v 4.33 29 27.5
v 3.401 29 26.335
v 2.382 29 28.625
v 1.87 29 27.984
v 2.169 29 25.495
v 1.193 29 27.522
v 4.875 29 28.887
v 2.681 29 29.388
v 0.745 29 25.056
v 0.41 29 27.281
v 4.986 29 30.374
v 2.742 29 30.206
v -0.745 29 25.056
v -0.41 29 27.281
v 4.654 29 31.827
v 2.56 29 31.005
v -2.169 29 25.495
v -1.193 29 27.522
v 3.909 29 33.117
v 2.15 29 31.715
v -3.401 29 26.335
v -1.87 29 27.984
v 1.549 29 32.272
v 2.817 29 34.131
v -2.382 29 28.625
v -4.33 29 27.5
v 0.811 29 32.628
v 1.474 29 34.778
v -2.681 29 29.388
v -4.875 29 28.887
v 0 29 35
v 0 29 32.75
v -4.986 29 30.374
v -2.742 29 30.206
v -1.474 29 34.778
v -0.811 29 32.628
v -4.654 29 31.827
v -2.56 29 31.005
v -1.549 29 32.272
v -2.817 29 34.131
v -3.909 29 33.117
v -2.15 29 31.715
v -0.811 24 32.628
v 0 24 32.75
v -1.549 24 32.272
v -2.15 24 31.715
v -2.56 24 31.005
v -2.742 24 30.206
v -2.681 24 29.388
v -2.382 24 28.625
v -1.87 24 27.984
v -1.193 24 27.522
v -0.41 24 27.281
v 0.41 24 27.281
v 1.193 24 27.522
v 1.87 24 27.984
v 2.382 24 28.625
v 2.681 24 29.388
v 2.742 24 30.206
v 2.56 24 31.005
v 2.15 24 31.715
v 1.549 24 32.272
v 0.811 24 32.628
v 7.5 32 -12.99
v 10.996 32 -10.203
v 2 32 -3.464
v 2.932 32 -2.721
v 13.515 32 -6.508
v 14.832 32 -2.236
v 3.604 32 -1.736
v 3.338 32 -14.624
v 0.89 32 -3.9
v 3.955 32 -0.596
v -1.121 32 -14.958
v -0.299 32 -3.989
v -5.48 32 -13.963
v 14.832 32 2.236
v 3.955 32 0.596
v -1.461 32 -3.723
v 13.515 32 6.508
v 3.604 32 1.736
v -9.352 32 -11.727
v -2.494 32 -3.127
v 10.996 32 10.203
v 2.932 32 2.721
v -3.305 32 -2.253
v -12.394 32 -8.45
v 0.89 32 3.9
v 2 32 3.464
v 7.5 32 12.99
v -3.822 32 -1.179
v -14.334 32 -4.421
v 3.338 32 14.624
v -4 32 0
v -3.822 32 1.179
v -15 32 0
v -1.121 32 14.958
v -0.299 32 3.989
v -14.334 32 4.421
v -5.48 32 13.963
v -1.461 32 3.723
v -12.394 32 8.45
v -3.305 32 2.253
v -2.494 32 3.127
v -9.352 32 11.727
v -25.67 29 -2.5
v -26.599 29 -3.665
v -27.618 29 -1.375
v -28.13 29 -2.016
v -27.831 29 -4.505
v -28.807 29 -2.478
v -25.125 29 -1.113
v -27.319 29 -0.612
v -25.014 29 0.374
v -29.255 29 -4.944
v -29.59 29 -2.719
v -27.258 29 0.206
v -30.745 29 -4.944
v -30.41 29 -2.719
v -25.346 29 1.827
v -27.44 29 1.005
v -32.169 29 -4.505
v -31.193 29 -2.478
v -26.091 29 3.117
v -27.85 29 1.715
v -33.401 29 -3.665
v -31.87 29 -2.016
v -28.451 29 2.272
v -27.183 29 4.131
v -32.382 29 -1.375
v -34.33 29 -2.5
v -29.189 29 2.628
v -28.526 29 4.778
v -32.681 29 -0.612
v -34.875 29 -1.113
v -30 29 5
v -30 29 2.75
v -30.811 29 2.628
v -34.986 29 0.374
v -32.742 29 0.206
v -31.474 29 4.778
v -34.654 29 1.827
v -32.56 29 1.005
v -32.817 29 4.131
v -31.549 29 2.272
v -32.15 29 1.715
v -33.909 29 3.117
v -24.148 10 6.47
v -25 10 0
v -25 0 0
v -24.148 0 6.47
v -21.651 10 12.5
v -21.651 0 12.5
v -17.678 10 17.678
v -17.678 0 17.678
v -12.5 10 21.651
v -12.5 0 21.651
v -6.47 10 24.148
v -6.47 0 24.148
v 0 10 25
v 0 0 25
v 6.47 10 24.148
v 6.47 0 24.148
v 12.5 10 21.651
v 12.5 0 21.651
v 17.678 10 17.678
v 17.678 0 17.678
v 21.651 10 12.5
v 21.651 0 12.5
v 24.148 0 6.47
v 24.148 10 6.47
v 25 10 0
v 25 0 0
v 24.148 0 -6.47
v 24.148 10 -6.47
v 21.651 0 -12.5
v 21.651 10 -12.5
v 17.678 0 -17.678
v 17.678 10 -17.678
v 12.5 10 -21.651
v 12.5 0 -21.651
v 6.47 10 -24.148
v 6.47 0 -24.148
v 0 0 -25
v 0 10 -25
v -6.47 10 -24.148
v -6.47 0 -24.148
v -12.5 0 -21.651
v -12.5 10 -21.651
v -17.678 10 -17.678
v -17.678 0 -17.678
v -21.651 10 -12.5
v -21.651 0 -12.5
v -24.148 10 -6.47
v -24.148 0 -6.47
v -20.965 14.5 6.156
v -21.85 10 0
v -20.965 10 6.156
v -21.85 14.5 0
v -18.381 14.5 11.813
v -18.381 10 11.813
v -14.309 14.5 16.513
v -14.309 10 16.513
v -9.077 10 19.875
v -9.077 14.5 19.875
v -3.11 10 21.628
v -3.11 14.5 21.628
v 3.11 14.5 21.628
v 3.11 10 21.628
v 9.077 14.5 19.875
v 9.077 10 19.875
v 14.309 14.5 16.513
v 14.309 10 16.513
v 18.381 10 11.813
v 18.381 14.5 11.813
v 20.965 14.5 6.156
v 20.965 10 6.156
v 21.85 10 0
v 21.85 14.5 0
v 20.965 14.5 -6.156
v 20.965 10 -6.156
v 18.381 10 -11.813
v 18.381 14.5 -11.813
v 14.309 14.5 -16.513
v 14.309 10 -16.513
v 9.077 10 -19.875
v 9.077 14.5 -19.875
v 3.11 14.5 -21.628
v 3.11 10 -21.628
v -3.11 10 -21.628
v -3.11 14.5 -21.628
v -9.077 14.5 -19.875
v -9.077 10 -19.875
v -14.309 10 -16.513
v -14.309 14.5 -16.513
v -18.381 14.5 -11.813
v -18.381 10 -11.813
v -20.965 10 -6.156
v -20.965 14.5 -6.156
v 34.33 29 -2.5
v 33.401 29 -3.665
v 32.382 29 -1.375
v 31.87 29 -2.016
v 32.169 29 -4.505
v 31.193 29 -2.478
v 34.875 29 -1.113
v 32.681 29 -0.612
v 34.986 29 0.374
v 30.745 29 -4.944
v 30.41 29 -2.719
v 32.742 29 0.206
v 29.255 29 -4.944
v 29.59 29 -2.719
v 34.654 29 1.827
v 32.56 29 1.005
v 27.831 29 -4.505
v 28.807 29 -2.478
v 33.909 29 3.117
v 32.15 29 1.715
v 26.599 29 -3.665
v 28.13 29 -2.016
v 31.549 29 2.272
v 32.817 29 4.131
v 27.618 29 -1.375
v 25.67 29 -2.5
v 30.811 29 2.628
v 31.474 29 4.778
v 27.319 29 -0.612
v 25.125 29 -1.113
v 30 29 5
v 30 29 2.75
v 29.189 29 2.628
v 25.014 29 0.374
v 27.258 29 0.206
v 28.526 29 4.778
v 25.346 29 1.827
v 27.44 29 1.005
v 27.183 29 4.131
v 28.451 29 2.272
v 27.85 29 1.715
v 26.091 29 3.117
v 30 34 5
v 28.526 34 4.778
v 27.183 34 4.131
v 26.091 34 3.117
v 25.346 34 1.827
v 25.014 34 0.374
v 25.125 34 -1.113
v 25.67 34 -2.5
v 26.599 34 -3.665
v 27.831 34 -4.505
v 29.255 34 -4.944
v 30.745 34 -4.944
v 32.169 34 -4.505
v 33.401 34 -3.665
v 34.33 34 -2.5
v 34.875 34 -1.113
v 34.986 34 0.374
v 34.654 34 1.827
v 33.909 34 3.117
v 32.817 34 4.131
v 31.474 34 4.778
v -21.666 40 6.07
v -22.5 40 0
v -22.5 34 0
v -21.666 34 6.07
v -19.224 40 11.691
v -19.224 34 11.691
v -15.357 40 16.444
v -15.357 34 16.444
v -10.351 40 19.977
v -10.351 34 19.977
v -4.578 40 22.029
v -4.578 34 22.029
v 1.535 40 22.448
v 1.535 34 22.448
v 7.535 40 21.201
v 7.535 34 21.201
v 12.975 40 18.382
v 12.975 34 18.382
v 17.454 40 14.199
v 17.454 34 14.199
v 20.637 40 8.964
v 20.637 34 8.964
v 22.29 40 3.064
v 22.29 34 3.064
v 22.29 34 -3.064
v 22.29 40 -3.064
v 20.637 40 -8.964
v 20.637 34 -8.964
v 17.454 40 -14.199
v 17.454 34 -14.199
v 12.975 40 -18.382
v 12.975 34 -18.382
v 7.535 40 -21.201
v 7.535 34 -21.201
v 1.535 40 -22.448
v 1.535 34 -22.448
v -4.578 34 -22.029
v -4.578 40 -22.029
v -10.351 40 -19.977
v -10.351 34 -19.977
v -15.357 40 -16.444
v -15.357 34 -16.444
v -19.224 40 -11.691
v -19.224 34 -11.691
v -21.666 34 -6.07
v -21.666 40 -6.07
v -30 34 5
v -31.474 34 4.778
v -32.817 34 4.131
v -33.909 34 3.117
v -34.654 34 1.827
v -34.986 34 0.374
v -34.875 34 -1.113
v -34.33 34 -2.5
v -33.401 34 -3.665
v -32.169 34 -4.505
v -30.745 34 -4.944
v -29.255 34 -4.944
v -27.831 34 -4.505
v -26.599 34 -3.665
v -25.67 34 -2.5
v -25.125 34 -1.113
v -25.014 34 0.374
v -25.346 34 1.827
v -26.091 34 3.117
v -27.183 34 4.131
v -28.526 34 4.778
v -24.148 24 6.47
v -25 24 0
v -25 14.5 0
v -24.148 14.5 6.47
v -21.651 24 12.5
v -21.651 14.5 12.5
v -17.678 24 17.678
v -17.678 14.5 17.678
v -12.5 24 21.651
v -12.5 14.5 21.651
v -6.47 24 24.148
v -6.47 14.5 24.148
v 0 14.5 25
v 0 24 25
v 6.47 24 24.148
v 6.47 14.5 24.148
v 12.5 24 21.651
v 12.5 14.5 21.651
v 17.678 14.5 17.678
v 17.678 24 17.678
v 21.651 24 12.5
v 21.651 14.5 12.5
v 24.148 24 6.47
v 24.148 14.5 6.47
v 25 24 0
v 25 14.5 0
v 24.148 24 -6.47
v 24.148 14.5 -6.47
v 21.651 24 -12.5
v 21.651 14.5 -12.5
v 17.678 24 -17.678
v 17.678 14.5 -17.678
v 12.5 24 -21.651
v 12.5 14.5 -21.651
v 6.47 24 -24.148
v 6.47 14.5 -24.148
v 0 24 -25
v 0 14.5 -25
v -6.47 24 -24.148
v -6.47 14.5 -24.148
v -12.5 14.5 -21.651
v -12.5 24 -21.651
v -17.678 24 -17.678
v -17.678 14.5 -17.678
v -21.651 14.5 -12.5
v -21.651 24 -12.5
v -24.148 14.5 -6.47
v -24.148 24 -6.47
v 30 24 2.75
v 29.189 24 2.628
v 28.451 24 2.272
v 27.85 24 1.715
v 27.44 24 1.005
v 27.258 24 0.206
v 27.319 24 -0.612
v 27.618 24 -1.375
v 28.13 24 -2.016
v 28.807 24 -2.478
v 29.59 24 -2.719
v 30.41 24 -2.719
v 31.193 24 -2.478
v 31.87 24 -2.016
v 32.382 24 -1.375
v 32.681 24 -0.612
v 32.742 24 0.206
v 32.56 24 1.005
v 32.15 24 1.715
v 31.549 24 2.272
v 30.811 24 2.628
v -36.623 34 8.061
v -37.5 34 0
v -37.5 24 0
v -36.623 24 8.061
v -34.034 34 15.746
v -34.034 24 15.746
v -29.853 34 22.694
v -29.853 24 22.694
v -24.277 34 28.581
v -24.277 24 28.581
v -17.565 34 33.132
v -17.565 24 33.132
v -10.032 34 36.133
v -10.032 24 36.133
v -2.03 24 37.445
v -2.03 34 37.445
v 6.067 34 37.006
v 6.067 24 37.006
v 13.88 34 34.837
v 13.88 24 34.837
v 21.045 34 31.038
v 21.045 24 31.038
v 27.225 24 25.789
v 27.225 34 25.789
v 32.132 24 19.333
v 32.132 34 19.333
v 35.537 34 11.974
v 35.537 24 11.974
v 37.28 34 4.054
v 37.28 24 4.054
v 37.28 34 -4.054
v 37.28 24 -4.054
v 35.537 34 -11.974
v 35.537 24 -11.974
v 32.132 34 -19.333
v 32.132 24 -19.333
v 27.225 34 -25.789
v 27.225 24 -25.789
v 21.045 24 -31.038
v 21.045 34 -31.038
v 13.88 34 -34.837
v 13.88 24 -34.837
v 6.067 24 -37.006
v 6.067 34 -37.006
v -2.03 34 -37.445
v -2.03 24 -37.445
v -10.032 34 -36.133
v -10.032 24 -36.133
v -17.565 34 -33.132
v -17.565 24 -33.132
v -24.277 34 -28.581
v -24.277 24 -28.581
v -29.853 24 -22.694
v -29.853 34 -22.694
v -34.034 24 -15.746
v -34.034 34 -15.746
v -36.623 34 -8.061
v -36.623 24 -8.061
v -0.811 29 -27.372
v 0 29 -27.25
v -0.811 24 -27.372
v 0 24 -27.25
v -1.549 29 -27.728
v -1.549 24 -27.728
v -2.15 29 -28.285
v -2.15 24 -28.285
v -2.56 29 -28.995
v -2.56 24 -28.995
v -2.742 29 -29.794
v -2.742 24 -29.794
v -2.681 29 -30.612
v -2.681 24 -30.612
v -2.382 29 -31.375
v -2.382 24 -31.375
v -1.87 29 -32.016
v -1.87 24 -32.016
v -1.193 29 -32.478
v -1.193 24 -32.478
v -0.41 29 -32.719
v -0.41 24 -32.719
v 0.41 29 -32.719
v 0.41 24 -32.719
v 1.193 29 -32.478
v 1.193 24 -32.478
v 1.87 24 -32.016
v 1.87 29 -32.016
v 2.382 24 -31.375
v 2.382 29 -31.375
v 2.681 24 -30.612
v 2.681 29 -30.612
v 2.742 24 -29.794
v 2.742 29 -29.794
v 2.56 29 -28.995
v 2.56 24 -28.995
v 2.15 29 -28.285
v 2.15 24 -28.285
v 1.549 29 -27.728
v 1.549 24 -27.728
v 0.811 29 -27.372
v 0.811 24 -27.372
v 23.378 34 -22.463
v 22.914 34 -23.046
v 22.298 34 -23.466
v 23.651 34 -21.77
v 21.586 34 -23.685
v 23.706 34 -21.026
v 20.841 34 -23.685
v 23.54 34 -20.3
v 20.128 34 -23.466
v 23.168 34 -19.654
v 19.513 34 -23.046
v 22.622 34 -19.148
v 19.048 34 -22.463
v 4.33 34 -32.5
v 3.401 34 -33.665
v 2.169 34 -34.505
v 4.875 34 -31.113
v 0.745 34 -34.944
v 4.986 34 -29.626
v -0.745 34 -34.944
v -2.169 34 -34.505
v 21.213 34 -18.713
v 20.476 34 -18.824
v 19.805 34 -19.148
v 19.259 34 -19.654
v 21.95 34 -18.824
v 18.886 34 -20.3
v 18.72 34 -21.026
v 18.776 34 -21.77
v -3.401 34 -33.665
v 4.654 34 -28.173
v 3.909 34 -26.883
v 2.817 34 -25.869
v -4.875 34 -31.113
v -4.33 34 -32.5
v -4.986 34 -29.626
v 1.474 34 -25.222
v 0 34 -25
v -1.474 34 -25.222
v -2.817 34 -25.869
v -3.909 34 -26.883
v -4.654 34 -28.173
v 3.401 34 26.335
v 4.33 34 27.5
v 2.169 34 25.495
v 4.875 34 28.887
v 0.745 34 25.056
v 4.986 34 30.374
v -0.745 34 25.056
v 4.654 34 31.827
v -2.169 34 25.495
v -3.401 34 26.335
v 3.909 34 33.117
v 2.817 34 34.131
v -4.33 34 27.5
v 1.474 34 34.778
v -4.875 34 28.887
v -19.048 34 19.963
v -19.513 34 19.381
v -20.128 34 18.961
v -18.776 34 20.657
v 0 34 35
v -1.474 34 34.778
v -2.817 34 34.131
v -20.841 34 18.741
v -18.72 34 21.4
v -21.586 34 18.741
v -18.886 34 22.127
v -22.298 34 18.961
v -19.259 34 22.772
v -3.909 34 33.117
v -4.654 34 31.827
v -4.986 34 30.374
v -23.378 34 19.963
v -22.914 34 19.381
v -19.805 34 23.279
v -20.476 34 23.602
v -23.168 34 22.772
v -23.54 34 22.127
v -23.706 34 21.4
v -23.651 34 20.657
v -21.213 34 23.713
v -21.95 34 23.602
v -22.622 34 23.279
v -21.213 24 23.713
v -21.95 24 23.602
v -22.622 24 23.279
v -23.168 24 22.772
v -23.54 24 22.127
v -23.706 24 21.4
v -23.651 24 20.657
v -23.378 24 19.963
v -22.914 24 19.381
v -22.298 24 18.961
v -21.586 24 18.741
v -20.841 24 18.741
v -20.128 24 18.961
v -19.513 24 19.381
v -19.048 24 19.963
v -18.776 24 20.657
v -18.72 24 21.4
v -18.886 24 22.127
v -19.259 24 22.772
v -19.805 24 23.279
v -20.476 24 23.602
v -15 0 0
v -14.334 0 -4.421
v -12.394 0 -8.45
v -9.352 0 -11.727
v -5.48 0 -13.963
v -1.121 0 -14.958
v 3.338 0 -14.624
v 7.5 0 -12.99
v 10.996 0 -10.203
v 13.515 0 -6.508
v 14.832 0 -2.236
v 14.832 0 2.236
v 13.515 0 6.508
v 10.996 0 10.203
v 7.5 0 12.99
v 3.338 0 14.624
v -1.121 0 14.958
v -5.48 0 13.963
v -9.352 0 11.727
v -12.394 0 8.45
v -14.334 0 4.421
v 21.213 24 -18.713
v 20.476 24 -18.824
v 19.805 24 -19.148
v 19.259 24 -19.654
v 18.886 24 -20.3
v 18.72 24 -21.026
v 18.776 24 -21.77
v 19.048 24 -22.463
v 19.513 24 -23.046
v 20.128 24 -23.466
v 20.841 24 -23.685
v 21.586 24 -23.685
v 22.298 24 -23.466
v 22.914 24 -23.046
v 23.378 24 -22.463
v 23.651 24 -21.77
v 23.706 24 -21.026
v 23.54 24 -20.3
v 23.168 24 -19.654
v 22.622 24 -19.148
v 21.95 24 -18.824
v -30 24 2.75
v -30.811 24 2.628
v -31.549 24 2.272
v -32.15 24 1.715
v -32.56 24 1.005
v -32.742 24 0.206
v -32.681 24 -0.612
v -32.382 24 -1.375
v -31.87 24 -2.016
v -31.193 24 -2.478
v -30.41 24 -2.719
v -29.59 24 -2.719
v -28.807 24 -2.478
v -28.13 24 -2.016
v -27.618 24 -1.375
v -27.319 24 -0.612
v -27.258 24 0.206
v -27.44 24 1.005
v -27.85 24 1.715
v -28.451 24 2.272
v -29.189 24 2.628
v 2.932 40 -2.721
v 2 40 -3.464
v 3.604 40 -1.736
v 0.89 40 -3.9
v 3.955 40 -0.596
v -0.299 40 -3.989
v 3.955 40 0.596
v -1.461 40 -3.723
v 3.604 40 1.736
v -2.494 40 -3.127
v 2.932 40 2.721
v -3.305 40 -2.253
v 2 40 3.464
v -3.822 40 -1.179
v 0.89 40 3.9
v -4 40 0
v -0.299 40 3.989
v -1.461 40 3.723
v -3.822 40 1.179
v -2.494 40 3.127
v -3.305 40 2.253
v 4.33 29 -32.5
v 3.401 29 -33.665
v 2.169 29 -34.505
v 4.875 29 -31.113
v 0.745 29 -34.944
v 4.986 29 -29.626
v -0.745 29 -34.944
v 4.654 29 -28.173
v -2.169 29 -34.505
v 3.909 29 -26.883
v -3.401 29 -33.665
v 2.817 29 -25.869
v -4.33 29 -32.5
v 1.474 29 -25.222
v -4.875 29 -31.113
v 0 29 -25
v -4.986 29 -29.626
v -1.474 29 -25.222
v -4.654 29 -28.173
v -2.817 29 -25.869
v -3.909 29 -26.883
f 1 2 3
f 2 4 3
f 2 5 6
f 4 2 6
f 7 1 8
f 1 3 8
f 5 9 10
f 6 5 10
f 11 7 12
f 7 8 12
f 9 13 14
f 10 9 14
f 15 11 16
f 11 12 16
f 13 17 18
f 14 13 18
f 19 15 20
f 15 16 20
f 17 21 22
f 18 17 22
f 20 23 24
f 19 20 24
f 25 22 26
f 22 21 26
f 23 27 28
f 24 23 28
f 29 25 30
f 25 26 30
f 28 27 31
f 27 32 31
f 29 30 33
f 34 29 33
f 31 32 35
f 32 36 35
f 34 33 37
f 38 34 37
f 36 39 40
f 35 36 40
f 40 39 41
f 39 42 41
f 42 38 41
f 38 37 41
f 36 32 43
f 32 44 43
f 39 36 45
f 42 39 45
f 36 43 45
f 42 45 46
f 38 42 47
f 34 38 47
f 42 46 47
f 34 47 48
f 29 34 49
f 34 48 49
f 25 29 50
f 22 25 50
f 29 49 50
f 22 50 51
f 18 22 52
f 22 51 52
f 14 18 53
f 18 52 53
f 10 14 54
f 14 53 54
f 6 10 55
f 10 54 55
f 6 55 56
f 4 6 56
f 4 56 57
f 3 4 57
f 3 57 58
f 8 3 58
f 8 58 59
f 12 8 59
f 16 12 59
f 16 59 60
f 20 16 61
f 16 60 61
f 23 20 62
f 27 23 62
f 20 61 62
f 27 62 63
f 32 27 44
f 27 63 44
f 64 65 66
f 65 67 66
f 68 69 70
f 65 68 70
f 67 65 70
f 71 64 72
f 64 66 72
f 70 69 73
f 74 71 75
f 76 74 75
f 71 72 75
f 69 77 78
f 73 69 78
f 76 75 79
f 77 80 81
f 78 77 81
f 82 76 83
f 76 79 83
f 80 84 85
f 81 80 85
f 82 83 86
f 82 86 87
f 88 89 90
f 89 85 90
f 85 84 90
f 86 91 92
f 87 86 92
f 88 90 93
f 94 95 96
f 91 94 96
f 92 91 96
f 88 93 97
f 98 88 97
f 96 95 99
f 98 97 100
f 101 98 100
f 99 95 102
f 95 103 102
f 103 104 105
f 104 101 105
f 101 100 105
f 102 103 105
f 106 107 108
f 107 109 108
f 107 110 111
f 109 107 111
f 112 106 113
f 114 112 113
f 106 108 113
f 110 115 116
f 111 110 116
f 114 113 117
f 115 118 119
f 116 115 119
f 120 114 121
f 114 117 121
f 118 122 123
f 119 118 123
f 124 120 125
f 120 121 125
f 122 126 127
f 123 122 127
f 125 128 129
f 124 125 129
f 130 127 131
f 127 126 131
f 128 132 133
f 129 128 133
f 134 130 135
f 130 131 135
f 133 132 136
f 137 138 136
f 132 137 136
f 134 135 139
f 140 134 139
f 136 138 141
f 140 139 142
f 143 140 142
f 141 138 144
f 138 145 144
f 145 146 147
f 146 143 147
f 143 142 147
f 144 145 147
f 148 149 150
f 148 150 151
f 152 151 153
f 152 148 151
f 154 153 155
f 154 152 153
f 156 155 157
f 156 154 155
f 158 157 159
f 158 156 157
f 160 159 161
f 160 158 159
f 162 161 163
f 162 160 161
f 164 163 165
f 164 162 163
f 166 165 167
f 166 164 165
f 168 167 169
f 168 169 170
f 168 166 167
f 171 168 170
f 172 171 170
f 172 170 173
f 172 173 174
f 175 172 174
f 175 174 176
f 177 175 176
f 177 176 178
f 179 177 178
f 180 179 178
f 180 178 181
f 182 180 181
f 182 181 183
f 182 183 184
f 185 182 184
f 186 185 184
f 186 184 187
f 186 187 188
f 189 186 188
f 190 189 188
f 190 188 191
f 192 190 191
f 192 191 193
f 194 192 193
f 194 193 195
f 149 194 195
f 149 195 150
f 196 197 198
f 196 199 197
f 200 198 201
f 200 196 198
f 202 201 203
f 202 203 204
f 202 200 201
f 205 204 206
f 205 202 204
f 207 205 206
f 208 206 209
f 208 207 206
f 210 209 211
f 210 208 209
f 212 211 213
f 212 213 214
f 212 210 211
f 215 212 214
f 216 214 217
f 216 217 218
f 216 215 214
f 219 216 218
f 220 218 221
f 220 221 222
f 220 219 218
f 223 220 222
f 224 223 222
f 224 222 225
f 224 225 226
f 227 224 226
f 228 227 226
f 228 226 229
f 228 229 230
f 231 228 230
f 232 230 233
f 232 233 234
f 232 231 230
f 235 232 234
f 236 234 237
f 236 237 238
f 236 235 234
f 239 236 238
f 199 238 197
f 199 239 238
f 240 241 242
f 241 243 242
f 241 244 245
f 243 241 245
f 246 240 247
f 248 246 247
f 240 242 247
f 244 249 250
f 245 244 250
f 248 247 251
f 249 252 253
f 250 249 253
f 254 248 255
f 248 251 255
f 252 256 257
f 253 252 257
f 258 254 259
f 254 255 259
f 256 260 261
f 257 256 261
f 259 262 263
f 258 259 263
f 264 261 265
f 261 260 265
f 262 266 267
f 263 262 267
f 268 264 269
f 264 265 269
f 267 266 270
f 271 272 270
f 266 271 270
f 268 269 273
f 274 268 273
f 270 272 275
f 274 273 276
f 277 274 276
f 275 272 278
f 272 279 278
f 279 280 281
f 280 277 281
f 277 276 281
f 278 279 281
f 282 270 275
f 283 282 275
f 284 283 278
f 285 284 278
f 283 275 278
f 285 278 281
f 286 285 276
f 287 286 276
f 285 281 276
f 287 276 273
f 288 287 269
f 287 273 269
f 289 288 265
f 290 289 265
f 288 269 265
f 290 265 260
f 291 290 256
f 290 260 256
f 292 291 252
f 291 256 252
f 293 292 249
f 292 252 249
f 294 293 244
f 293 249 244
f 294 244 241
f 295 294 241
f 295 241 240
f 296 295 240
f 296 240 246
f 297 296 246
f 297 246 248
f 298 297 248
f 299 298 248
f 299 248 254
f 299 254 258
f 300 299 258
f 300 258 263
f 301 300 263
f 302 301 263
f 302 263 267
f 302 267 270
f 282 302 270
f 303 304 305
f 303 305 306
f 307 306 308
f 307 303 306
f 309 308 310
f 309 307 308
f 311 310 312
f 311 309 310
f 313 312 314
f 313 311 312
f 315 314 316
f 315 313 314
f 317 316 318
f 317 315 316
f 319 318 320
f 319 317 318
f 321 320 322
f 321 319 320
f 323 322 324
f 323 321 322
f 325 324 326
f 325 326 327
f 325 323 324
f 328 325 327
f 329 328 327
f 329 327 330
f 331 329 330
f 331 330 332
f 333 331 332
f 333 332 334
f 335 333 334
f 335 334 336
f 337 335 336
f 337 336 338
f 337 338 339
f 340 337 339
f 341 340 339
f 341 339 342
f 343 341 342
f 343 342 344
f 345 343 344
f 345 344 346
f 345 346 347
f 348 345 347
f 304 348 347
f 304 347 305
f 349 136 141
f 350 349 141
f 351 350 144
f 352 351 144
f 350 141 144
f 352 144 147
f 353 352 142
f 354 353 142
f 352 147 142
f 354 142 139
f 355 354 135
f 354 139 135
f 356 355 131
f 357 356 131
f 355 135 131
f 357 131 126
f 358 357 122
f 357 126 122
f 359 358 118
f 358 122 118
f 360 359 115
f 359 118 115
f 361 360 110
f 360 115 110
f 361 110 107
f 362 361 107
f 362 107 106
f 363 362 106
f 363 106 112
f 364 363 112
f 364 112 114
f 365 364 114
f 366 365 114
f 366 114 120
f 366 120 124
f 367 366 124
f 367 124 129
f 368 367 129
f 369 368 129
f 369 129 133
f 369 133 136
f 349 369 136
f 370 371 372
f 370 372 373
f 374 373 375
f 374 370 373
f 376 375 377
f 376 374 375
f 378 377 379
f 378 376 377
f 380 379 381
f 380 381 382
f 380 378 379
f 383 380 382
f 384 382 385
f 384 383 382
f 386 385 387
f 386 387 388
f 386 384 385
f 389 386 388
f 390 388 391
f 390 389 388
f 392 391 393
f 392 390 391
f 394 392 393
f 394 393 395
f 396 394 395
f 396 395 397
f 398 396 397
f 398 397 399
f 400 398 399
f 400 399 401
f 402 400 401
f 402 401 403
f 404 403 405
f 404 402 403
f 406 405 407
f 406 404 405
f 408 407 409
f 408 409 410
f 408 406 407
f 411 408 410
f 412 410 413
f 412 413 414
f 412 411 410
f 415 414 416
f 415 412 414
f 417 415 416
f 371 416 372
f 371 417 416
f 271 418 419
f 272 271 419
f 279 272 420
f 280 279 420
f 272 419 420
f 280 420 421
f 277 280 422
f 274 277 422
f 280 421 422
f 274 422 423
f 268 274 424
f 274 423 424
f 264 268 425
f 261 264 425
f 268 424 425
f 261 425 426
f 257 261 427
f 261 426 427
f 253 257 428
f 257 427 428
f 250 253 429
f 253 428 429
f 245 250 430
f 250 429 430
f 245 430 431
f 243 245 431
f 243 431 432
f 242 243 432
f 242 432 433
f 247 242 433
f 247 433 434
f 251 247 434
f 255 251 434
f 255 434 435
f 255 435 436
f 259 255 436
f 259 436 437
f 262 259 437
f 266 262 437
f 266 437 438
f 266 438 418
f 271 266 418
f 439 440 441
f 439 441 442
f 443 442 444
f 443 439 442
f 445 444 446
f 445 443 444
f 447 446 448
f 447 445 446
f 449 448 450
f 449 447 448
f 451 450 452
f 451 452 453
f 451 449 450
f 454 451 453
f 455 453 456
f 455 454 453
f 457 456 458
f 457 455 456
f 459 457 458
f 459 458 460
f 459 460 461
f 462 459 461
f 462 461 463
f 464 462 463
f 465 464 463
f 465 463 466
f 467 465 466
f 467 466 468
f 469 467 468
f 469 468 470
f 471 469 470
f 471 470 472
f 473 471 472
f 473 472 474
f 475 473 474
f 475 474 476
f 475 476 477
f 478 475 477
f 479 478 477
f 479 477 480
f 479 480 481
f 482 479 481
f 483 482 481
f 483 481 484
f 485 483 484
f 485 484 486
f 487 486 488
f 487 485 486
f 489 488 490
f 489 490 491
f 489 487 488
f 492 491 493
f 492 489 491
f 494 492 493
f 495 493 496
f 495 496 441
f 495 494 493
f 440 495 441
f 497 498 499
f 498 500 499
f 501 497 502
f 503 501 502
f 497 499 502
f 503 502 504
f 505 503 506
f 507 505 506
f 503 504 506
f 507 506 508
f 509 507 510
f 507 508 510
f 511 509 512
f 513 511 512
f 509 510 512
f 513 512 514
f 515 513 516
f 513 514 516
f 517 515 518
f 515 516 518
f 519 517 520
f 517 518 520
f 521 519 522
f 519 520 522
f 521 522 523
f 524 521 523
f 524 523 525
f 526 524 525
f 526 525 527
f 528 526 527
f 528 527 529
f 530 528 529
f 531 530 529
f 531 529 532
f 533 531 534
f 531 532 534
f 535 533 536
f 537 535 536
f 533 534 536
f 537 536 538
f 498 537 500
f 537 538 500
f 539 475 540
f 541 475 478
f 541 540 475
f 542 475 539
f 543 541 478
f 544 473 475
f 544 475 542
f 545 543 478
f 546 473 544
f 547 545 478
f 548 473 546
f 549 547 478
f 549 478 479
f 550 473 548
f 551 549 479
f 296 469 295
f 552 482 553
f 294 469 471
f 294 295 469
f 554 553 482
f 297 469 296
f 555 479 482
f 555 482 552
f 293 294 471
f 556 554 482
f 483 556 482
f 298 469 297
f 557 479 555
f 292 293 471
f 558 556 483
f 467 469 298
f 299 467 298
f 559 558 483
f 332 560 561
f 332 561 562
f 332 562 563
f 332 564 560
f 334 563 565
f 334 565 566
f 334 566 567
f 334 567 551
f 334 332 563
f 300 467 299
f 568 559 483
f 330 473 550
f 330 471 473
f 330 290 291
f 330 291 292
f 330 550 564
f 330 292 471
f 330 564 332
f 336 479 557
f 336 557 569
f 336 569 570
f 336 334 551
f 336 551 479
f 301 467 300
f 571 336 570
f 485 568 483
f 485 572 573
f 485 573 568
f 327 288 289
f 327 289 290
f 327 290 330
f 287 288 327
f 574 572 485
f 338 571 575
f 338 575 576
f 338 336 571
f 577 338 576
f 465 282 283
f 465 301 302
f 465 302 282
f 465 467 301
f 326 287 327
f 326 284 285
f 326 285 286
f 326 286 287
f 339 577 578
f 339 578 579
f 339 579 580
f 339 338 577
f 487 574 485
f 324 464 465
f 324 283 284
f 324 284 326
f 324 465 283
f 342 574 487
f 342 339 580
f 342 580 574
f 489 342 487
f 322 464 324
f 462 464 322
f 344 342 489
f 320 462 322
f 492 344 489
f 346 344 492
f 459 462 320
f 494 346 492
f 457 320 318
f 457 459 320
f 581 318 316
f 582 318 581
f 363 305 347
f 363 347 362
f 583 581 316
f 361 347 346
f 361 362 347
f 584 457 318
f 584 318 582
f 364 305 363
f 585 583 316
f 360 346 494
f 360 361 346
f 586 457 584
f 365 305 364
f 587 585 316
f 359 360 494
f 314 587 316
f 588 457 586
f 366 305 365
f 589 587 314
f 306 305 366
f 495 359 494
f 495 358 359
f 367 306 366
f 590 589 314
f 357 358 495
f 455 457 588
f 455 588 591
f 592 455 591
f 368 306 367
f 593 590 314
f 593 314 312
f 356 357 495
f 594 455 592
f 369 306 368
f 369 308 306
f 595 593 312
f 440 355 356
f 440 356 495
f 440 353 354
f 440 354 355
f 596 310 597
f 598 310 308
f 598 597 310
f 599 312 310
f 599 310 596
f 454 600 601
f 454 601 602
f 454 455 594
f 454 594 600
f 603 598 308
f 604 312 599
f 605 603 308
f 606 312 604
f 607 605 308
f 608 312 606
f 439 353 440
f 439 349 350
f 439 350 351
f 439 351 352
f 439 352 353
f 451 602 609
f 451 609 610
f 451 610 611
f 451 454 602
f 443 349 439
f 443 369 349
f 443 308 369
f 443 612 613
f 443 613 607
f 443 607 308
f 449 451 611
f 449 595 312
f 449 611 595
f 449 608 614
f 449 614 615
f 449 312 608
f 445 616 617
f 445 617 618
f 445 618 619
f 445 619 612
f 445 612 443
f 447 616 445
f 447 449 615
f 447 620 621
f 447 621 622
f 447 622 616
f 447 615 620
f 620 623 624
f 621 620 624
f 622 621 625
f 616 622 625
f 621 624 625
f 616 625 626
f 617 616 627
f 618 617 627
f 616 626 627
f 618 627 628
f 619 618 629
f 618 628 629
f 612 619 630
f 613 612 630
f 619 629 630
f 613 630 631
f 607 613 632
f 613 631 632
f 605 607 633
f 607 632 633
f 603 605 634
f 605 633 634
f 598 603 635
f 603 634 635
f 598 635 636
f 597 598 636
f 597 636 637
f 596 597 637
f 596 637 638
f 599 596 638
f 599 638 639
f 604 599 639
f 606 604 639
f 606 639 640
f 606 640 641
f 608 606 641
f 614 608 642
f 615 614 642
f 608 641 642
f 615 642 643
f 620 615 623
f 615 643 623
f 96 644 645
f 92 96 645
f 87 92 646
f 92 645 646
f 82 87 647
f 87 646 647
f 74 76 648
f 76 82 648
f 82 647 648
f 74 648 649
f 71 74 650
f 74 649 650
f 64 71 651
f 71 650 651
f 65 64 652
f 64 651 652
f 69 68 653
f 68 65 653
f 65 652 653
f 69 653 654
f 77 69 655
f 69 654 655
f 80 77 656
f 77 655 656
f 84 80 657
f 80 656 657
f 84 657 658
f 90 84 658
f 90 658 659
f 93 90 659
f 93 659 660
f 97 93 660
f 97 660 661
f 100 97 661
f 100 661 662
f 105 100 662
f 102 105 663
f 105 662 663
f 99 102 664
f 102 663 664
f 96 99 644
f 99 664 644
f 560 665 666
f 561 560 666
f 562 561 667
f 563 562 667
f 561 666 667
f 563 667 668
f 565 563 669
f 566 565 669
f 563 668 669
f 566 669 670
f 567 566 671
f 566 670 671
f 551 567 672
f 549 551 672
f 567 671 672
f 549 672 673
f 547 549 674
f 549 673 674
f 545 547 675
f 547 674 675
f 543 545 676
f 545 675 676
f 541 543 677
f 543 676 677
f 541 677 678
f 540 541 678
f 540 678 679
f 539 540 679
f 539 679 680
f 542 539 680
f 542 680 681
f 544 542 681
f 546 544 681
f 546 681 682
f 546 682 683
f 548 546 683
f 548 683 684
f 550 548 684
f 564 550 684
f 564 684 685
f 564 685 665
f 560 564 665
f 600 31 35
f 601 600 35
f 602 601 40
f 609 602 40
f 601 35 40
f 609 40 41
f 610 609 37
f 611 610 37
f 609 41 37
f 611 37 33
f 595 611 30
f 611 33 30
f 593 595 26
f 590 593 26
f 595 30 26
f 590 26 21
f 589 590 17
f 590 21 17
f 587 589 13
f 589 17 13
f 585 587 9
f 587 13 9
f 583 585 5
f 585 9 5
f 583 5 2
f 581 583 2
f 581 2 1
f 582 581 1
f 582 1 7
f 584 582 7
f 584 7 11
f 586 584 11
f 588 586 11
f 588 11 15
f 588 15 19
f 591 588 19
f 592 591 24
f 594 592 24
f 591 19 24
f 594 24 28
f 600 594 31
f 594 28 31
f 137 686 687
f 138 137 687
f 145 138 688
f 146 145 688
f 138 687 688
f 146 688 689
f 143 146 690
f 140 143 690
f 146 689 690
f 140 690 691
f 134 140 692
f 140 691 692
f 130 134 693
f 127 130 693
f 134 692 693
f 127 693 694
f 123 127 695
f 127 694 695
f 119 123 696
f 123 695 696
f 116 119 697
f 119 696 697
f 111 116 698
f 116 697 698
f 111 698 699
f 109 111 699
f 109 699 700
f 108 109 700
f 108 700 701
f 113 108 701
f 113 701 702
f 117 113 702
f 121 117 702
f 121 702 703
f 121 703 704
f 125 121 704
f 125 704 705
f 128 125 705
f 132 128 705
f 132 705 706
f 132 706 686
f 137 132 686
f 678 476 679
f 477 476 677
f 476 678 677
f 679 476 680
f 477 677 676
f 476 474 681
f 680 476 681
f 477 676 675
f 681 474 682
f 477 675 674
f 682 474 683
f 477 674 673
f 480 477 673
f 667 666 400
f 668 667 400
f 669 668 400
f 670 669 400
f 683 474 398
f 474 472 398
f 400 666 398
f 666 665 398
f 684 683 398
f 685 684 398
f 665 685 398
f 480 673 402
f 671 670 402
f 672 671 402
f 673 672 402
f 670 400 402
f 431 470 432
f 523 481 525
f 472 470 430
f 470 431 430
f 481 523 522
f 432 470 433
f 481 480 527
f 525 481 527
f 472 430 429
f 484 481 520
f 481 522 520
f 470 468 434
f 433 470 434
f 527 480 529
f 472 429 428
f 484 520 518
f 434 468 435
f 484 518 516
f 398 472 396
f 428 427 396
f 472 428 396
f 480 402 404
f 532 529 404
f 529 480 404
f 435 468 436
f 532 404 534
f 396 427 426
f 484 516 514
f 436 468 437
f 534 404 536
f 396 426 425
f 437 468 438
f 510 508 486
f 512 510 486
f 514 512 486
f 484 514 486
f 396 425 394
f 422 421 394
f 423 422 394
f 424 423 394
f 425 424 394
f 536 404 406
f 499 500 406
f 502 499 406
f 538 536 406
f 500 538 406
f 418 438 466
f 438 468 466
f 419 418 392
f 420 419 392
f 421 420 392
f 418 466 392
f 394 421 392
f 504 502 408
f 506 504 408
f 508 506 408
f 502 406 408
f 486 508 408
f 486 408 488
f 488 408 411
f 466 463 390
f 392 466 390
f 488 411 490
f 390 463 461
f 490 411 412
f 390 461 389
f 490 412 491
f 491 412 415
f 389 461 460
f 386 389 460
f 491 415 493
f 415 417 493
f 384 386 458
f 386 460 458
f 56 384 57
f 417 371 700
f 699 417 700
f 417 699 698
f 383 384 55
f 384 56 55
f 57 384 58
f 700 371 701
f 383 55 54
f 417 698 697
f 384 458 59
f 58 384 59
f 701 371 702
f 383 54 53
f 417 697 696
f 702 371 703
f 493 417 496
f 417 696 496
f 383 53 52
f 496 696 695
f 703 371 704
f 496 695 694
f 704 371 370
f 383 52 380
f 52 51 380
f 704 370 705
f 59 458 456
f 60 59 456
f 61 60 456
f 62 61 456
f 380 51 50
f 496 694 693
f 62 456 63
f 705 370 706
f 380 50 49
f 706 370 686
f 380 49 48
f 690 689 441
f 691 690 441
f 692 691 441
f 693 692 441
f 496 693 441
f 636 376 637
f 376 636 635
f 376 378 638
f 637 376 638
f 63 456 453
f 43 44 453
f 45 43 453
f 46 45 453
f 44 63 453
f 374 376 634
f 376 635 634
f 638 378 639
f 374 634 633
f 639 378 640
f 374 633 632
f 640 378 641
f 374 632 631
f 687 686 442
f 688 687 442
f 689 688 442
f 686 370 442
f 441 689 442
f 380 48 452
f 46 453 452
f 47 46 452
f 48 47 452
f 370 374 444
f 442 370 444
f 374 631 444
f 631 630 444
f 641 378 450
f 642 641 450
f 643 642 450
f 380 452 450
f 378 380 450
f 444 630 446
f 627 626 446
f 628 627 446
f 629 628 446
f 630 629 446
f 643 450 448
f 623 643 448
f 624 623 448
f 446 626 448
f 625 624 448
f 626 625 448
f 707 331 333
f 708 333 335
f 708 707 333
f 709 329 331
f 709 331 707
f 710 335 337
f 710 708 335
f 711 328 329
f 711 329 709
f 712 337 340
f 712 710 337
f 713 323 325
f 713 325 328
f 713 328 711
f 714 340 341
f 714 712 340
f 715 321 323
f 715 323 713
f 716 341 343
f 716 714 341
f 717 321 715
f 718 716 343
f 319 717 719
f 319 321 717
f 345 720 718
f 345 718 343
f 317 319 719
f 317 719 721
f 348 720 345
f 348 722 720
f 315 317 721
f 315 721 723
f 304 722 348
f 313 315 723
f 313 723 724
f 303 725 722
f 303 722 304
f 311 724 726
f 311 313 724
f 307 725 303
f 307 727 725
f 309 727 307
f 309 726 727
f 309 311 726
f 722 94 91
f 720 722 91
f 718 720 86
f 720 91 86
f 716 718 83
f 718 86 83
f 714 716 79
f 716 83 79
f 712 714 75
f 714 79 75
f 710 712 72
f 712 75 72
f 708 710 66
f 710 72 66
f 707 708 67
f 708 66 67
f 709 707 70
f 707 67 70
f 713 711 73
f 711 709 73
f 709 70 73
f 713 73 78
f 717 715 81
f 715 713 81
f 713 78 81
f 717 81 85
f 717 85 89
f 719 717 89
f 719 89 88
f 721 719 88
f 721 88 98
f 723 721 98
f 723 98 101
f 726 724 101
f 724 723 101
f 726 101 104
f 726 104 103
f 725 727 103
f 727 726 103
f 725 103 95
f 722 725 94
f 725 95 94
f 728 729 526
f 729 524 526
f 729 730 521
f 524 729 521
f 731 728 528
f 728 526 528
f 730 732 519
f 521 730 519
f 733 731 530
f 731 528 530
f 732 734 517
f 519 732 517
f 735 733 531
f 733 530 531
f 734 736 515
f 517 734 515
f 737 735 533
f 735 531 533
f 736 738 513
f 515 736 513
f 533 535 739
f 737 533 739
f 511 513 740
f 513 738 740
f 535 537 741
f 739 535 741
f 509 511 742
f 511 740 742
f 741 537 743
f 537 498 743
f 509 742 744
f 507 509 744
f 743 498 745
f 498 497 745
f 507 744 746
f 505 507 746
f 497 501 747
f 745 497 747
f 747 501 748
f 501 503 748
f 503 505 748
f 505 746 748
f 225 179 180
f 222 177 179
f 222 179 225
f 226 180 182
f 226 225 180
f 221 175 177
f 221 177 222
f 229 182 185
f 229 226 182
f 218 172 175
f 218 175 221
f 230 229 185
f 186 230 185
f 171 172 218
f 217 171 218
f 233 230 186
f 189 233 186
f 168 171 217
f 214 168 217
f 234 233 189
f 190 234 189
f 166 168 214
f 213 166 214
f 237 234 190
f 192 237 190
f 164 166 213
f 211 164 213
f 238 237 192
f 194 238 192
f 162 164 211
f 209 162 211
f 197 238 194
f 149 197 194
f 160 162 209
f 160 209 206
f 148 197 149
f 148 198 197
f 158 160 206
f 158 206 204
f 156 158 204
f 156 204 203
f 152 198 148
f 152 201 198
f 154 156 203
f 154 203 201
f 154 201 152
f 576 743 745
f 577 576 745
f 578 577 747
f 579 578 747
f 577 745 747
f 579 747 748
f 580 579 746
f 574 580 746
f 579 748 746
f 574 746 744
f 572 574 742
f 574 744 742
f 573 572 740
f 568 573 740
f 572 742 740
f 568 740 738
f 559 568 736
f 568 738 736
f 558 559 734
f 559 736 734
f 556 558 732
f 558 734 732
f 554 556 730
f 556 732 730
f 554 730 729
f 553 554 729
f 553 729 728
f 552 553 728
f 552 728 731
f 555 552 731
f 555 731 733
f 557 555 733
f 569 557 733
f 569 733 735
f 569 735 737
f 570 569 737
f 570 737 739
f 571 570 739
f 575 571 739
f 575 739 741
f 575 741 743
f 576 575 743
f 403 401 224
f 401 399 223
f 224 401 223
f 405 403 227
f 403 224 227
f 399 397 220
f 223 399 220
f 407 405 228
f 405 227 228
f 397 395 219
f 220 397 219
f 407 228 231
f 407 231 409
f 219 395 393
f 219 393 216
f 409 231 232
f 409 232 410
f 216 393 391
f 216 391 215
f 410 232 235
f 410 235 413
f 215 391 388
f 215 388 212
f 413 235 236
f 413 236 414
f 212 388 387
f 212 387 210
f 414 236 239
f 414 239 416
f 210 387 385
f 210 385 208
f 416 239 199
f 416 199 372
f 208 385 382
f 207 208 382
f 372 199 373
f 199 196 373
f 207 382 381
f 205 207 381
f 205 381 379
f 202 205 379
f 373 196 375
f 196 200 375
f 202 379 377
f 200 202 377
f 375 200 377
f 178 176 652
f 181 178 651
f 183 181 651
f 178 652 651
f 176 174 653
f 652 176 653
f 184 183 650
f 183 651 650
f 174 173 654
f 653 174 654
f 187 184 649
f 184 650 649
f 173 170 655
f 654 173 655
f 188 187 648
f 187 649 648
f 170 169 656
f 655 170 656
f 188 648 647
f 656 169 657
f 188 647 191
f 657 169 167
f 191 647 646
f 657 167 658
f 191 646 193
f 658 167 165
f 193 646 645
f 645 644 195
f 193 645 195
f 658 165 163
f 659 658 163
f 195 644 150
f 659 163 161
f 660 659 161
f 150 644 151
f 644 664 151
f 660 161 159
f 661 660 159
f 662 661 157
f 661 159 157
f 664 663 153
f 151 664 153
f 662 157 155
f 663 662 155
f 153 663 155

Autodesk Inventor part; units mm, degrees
ref_plane "YZ Plane" through (0, 0, 0) normal (1, 0, 0) x (0, 1, 0)
ref_plane "XZ Plane" through (0, 0, 0) normal (0, 1, 0) x (-1, 0, 0)
ref_plane "XY Plane" through (0, 0, 0) normal (0, 0, 1) x (1, 0, 0)
sketch "Schizzo1" plane through (0, 0, 0) normal (0, 0, 1) x (1, 0, 0)
  line L0 (0, 0) -> (0, 24.2842) construction
  line L1 (-25, 0) -> (-25, 10)
  line L2 (-25, 10) -> (-21.85, 10)
  line L3 (-21.85, 10) -> (-21.85, 14.5)
  line L4 (-21.85, 14.5) -> (-25, 14.5)
  line L5 (-25, 14.5) -> (-25, 24)
  line L6 (-25, 24) -> (-37.5, 24)
  line L7 (-37.5, 24) -> (-37.5, 34)
  line L8 (-37.5, 34) -> (-22.5, 34)
  line L9 (-22.5, 34) -> (-22.5, 40)
  line L10 (-22.5, 40) -> (-4, 40)
  line L11 (-4, 40) -> (-4, 32)
  line L12 (-4, 32) -> (-15, 32)
  line L13 (-15, 32) -> (-15, 0)
  line L14 (-25, 0) -> (-15, 0)
  dimension "d0" = 30
  dimension "d1" = 8
  dimension "d2" = 43.7
  dimension "d3" = 50
  dimension "d4" = 45
  dimension "d5" = 75
  dimension "d9" = 24
  dimension "d10" = 34
  dimension "d11" = 32
  dimension "d13" = 4.5
  dimension "d14" = 10
  dimension "d15" = 40
revolve "Rivoluzione1" add sketch "Schizzo1" angle 360 about axis through (0, 0, 0) along (0, 1, 0)
sketch "Schizzo2" plane through (0, 34, 0) normal (0, 1, 0) x (1, 0, 0)
  circle A0 centre (0, 0) radius 25 projected
  circle A1 centre (0, 0) radius 30 construction
  circle A2 centre (30, 0) radius 3.496
  circle A3 centre (0, 30) radius 2.9704
  circle A4 centre (-30, 0) radius 3.7285
  circle A5 centre (0, -30) radius 3.043
  circle A6 centre (-21.2132, -21.2132) radius 2.9112
  circle A7 centre (21.2132, 21.2132) radius 2.3494
  dimension "d17" = 60
  dimension "d18" = 45
  dimension "d19" = 45
hole "Foro1" at (-30, 34, 0) at (0, 34, -30) at (30, 34, 0) at (0, 34, 30) direction (0, -1, 0) diameter 5.5 end through all counterbore diameter 10 counterbore depth 5
hole "Foro2" at (21.2132, 34, -21.2132) at (-21.2132, 34, 21.2132) direction (0, -1, 0) diameter 5 end through all
properties part number "05-16-2023 Pompa Manuale OLIO"
